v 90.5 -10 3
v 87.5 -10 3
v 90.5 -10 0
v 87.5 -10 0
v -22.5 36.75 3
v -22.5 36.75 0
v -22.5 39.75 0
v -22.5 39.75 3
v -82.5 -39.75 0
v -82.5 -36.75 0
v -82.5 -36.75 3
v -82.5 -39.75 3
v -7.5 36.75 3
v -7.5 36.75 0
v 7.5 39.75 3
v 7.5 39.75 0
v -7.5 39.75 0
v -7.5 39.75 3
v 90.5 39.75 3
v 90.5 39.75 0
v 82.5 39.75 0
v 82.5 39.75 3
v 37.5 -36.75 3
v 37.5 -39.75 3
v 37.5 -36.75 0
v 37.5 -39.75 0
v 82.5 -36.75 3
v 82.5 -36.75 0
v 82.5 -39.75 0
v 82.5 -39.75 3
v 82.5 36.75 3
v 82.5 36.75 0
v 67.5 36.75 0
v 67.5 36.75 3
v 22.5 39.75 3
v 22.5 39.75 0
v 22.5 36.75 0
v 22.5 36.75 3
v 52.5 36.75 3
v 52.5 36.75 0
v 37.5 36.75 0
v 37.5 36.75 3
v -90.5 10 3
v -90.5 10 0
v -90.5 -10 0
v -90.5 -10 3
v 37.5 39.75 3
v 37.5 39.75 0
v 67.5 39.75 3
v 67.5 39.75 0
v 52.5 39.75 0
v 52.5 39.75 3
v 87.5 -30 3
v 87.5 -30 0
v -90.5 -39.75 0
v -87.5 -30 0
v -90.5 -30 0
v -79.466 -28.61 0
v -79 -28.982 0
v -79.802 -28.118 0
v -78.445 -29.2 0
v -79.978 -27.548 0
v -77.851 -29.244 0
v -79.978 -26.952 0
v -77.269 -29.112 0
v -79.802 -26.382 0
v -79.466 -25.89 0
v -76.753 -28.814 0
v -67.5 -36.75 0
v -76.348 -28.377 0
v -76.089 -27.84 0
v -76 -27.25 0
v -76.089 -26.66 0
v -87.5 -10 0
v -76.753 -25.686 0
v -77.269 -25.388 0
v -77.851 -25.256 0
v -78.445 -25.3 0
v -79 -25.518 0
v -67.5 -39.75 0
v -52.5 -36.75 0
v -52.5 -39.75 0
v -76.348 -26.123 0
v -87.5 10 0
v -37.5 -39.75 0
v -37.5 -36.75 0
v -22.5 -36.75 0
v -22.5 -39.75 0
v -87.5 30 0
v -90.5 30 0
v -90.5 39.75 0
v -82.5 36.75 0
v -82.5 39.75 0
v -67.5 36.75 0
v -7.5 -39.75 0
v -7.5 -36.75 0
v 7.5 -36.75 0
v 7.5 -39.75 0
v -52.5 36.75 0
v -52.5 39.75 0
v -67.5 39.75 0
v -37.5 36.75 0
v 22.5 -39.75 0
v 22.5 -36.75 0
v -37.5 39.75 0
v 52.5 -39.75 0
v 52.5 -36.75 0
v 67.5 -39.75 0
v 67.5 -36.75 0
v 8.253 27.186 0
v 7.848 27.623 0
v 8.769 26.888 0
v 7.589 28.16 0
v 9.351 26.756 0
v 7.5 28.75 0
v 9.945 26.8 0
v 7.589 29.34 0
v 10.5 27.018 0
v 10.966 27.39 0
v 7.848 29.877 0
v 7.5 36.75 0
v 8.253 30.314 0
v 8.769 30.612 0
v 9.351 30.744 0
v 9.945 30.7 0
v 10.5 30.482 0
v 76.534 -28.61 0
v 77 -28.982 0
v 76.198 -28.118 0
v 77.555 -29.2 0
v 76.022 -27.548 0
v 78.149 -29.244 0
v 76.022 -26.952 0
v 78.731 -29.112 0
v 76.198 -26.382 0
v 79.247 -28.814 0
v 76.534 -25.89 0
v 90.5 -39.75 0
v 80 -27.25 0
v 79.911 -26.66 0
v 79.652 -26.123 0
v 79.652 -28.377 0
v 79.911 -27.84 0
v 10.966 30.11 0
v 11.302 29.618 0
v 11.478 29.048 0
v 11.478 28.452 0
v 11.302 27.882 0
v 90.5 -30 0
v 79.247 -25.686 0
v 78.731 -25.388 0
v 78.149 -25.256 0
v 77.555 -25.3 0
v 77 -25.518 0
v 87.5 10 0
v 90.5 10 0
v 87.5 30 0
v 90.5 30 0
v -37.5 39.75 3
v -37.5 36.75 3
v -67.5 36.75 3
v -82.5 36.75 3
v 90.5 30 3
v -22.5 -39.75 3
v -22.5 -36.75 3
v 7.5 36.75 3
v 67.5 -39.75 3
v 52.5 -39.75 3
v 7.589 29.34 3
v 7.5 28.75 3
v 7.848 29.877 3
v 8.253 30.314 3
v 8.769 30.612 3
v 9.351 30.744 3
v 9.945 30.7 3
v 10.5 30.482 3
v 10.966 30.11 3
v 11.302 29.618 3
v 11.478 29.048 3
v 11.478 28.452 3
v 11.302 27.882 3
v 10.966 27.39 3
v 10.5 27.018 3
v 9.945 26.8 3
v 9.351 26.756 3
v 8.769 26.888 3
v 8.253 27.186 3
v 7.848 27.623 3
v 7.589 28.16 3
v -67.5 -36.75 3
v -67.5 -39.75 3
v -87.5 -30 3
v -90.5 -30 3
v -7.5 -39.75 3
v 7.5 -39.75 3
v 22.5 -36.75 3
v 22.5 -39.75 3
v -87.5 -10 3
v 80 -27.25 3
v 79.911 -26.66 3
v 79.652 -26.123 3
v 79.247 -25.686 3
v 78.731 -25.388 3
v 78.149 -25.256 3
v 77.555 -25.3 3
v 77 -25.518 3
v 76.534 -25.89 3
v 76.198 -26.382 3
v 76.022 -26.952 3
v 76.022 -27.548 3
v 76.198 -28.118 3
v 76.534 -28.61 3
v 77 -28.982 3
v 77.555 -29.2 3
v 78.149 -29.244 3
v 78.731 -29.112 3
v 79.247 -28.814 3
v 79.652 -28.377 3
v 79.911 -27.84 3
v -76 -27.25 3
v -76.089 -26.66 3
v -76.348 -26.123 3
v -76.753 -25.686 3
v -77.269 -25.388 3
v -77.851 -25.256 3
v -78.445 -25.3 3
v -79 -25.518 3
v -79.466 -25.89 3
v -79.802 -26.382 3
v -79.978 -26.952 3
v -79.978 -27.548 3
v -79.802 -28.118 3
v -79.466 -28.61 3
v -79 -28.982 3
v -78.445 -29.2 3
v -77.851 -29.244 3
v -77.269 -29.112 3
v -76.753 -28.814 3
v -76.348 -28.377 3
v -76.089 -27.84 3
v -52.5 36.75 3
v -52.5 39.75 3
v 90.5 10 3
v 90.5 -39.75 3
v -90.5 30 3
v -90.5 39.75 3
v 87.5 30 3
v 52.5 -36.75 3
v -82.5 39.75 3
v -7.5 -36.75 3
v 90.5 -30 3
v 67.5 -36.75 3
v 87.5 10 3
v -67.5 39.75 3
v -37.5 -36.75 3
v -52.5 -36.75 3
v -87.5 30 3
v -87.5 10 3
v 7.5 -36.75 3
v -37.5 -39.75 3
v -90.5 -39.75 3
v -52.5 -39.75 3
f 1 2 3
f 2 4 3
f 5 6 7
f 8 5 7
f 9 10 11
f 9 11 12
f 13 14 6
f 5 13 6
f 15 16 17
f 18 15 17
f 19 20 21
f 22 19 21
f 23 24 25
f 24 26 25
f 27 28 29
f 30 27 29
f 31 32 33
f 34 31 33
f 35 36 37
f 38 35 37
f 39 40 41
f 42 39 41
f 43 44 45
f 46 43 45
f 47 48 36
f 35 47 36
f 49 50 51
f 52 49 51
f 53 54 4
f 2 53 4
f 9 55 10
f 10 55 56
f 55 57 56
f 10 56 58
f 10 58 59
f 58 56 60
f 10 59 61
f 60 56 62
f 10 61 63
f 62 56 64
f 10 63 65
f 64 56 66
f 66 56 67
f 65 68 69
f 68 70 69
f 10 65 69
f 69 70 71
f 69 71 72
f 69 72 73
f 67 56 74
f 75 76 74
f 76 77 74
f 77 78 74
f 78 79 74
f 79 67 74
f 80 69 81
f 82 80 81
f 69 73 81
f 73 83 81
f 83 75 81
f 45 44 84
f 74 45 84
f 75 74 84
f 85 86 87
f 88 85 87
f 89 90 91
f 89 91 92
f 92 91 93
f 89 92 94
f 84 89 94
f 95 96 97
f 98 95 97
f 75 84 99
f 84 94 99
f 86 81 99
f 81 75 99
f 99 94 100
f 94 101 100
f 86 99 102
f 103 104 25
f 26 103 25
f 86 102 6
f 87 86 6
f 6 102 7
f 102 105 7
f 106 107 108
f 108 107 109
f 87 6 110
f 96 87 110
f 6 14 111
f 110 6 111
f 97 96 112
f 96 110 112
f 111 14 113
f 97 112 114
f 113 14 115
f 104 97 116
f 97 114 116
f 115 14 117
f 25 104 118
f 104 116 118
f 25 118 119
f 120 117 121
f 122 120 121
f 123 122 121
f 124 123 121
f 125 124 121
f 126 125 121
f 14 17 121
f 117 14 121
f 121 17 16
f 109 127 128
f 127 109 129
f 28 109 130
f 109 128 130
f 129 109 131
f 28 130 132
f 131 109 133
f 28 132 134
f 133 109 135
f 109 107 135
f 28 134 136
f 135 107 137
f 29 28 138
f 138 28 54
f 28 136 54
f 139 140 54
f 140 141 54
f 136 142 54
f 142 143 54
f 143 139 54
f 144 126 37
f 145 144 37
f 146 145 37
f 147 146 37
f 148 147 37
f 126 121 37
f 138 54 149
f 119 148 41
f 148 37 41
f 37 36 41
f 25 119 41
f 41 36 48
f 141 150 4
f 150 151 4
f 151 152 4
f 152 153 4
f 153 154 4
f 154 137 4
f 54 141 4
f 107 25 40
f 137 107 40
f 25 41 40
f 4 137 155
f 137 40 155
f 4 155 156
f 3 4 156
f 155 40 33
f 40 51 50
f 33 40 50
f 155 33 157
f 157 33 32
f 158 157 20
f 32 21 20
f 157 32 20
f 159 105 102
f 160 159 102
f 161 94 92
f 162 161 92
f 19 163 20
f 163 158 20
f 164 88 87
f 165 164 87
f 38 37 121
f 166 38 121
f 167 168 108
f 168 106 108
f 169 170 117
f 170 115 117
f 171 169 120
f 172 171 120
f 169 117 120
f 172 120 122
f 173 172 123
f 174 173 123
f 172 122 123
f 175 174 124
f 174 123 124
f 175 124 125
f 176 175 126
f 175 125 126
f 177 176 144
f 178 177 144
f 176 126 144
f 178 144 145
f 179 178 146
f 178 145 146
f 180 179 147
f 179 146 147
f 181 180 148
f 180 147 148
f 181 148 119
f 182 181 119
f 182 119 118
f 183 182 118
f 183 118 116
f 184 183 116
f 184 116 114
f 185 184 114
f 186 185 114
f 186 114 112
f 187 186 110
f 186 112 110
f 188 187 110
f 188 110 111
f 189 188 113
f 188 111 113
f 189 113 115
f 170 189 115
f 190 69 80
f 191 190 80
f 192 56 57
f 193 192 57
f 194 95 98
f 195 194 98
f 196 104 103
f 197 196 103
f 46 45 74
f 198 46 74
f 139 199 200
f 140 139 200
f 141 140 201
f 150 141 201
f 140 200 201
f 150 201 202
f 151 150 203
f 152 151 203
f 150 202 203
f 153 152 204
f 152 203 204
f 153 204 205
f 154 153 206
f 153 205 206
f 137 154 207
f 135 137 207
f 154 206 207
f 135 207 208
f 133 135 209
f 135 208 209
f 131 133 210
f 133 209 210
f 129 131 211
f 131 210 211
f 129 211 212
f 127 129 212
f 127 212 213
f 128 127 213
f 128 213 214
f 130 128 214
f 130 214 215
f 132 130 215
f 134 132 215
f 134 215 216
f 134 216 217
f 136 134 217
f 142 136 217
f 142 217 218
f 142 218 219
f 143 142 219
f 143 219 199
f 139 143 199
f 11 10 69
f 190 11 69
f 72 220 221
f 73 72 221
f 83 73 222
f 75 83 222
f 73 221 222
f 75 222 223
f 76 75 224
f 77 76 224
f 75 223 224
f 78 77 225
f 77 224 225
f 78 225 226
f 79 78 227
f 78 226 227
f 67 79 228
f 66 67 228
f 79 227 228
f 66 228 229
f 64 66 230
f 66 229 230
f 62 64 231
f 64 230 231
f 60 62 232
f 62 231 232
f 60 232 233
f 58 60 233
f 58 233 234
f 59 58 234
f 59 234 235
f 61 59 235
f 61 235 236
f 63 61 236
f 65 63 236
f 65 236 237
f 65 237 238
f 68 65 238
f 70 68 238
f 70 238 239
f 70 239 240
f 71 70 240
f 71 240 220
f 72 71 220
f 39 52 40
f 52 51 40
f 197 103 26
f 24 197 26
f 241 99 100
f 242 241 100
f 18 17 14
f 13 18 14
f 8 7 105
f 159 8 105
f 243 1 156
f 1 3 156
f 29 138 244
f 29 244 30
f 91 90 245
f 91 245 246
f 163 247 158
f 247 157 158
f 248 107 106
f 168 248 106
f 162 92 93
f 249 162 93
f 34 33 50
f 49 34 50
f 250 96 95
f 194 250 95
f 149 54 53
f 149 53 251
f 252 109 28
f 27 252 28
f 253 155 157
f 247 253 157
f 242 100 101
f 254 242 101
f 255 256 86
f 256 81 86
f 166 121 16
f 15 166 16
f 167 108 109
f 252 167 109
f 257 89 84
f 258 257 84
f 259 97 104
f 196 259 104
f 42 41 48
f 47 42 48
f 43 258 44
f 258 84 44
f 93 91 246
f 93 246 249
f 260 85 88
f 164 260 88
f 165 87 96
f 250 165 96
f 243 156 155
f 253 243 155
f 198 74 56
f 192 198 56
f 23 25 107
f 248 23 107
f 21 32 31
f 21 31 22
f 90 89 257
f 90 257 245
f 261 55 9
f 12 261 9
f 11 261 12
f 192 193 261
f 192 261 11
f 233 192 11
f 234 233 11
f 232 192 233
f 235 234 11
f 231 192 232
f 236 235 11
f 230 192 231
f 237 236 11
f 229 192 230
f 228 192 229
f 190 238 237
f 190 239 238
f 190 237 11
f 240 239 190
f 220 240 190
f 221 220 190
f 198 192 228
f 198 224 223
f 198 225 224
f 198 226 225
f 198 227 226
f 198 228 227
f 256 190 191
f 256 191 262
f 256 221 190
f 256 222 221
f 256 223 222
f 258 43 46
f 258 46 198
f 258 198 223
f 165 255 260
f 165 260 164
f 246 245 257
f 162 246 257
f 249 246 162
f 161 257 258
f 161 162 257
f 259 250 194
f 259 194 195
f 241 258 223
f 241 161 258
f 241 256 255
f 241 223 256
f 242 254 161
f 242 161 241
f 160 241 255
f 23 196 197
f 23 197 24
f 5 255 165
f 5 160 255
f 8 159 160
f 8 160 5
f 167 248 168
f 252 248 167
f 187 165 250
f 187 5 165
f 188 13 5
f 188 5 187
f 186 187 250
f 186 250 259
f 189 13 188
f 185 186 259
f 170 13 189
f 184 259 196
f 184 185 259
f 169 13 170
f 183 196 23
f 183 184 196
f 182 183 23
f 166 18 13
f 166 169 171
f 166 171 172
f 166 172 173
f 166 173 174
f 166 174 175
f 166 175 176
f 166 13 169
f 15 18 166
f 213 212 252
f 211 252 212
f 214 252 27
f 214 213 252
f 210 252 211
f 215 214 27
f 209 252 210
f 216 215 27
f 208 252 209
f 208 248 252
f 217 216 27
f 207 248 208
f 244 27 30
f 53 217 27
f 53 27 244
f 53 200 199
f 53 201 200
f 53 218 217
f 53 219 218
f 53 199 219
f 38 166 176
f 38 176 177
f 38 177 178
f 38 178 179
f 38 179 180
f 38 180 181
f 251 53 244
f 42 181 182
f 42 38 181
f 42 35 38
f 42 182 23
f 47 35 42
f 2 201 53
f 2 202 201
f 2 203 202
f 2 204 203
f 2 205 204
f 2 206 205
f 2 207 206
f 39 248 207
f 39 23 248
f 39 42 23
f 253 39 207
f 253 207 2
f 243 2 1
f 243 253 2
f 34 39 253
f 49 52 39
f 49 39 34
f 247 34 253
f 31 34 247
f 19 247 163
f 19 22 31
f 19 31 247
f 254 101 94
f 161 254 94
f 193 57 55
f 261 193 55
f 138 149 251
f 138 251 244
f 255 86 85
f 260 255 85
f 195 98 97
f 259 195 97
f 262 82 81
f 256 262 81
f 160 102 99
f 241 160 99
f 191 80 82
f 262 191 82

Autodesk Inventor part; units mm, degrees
ref_plane "YZ Plane" through (0, 0, 0) normal (1, 0, 0) x (0, 1, 0)
ref_plane "XZ Plane" through (0, 0, 0) normal (0, 1, 0) x (-1, 0, 0)
ref_plane "XY Plane" through (0, 0, 0) normal (0, 0, 1) x (1, 0, 0)
sketch "Sketch1" plane through (0, 0, 0) normal (0, 0, 1) x (1, 0, 0)
  line L0 (-87.5, -36.75) -> (87.5, -36.75)
  line L1 (87.5, -36.75) -> (87.5, 36.75)
  line L2 (87.5, 36.75) -> (-87.5, 36.75)
  line L3 (-87.5, 36.75) -> (-87.5, -36.75)
  line L4 (-87.5, -36.75) -> (87.5, 36.75) construction
  line L5 (87.5, -36.75) -> (-87.5, 36.75) construction
  line L6 (-67.5, 36.75) -> (-52.5, 36.75)
  line L7 (-52.5, 36.75) -> (-52.5, 39.75)
  line L8 (-52.5, 39.75) -> (-67.5, 39.75)
  line L9 (-67.5, 39.75) -> (-67.5, 36.75)
  line L10 (-87.5, 10) -> (-90.5, 10)
  line L11 (-90.5, 10) -> (-90.5, -10)
  line L12 (-90.5, -10) -> (-87.5, -10)
  line L13 (-87.5, -10) -> (-87.5, 10)
  line L14 (-82.5, 36.75) -> (-82.5, 39.75)
  line L15 (-87.5, 30) -> (-90.5, 30)
  line L16 (-90.5, 30) -> (-90.5, 39.75)
  line L17 (-90.5, 39.75) -> (-82.5, 39.75)
  line L18 (-22.5, 36.75) -> (-22.5, 39.75)
  line L19 (-22.5, 39.75) -> (-37.5, 39.75)
  line L20 (-37.5, 39.75) -> (-37.5, 36.75)
  line L21 (-37.5, 36.75) -> (-22.5, 36.75)
  line L22 (7.5, 36.75) -> (7.5, 39.75)
  line L23 (7.5, 39.75) -> (-7.5, 39.75)
  line L24 (-7.5, 39.75) -> (-7.5, 36.75)
  line L25 (-7.5, 36.75) -> (7.5, 36.75)
  line L26 (37.5, 36.75) -> (37.5, 39.75)
  line L27 (37.5, 39.75) -> (22.5, 39.75)
  line L28 (22.5, 39.75) -> (22.5, 36.75)
  line L29 (22.5, 36.75) -> (37.5, 36.75)
  line L30 (67.5, 36.75) -> (67.5, 39.75)
  line L31 (67.5, 39.75) -> (52.5, 39.75)
  line L32 (52.5, 39.75) -> (52.5, 36.75)
  line L33 (52.5, 36.75) -> (67.5, 36.75)
  line L34 (-52.5, -39.75) -> (-52.5, -36.75)
  line L35 (-52.5, -36.75) -> (-67.5, -36.75)
  line L36 (-67.5, -36.75) -> (-67.5, -39.75)
  line L37 (-67.5, -39.75) -> (-52.5, -39.75)
  line L38 (-22.5, -39.75) -> (-22.5, -36.75)
  line L39 (-22.5, -36.75) -> (-37.5, -36.75)
  line L40 (-37.5, -36.75) -> (-37.5, -39.75)
  line L41 (-37.5, -39.75) -> (-22.5, -39.75)
  line L42 (7.5, -39.75) -> (7.5, -36.75)
  line L43 (7.5, -36.75) -> (-7.5, -36.75)
  line L44 (-7.5, -36.75) -> (-7.5, -39.75)
  line L45 (-7.5, -39.75) -> (7.5, -39.75)
  line L46 (37.5, -39.75) -> (37.5, -36.75)
  line L47 (37.5, -36.75) -> (22.5, -36.75)
  line L48 (22.5, -36.75) -> (22.5, -39.75)
  line L49 (22.5, -39.75) -> (37.5, -39.75)
  line L50 (67.5, -39.75) -> (67.5, -36.75)
  line L51 (67.5, -36.75) -> (52.5, -36.75)
  line L52 (52.5, -36.75) -> (52.5, -39.75)
  line L53 (52.5, -39.75) -> (67.5, -39.75)
  line L54 (90.5, 10) -> (87.5, 10)
  line L55 (87.5, 10) -> (87.5, -10)
  line L56 (87.5, -10) -> (90.5, -10)
  line L57 (90.5, -10) -> (90.5, 10)
  line L58 (-87.5, 0) -> (87.5, 0) construction
  line L59 (0, 36.75) -> (0, -36.75) construction
  line L60 (-87.5, 30) -> (-87.5, 36.75)
  line L61 (-82.5, 36.75) -> (-87.5, 36.75)
  line L62 (-82.5, -36.75) -> (-82.5, -39.75)
  line L63 (-87.5, -30) -> (-90.5, -30)
  line L64 (-90.5, -30) -> (-90.5, -39.75)
  line L65 (-90.5, -39.75) -> (-82.5, -39.75)
  line L66 (-87.5, -30) -> (-87.5, -36.75)
  line L67 (-82.5, -36.75) -> (-87.5, -36.75)
  line L68 (82.5, 36.75) -> (82.5, 39.75)
  line L69 (87.5, 30) -> (90.5, 30)
  line L70 (90.5, 30) -> (90.5, 39.75)
  line L71 (90.5, 39.75) -> (82.5, 39.75)
  line L72 (87.5, 30) -> (87.5, 36.75)
  line L73 (82.5, 36.75) -> (87.5, 36.75)
  line L74 (82.5, -36.75) -> (82.5, -39.75)
  line L75 (87.5, -30) -> (90.5, -30)
  line L76 (90.5, -30) -> (90.5, -39.75)
  line L77 (90.5, -39.75) -> (82.5, -39.75)
  line L78 (87.5, -30) -> (87.5, -36.75)
  line L79 (82.5, -36.75) -> (87.5, -36.75)
  point P0 (0, 0)
  dimension "d0" = 175
  dimension "d1" = 73.5
  dimension "d2" = 15
  dimension "d3" = 3
  dimension "d4" = 20
  dimension "d5" = 3
  dimension "d6" = 20
  dimension "d7" = 10
  dimension "d8" = 3
  dimension "d9" = 15
  dimension "d10" = 3
  dimension "d11" = 20
  dimension "d14" = 30
  dimension "d17" = 76.5
  dimension "d22" = 178
extrude "Extrusion1" add sketch "Sketch1" along normal blind 3
sketch "Sketch2" plane through (0, 0, 3) normal (0, 0, 1) x (1, 0, 0)
  circle A0 centre (-78, -27.25) radius 2
  circle A1 centre (78, -27.25) radius 2
  line L0 (87.5, -30) -> (87.5, -10) projected
  line L1 (67.5, -36.75) -> (82.5, -36.75) projected
  line L2 (-82.5, -36.75) -> (-67.5, -36.75) projected
  line L3 (-87.5, -10) -> (-87.5, -30) projected
  point P0 (0, 0)
  dimension "d29" = 4
  dimension "d30" = 4
  dimension "d31" = 9.5
  dimension "d32" = 9.5
  dimension "d33" = 9.5
  dimension "d34" = 9.5
extrude "Extrusion2" cut sketch "Sketch2" against normal blind 10
sketch "Sketch3" plane through (0, 0, 0) normal (0, 0, -1) x (-1, 0, 0)
  circle A0 centre (-9.5, 28.75) radius 2
  line L0 (-7.5, 39.75) -> (-7.5, 36.75) projected
  line L1 (-22.5, 36.75) -> (-7.5, 36.75) projected
  point P0 (0, 0)
  dimension "d37" = 4
  dimension "d38" = 2
  dimension "d39" = 8
extrude "Extrusion3" cut sketch "Sketch3" against normal blind 10
equation "\"BendRadius\" = Thickness"
equation "\"BendReliefWidth\" = Thickness"
equation "\"BendReliefDepth\" = 0.5 * Thickness"
equation "\"CornerReliefSize\" = 4 * Thickness"
equation "\"MinimumRemnant\" = 2 * Thickness"
equation "\"TransitionRadius\" = BendRadius"
equation "\"JacobiRadiusSize\" = BendRadius"
equation "\"GapSize\" = Thickness"
equation "\"Thickness\" = 0.5"
properties part number "12 boven plaat LCD"
